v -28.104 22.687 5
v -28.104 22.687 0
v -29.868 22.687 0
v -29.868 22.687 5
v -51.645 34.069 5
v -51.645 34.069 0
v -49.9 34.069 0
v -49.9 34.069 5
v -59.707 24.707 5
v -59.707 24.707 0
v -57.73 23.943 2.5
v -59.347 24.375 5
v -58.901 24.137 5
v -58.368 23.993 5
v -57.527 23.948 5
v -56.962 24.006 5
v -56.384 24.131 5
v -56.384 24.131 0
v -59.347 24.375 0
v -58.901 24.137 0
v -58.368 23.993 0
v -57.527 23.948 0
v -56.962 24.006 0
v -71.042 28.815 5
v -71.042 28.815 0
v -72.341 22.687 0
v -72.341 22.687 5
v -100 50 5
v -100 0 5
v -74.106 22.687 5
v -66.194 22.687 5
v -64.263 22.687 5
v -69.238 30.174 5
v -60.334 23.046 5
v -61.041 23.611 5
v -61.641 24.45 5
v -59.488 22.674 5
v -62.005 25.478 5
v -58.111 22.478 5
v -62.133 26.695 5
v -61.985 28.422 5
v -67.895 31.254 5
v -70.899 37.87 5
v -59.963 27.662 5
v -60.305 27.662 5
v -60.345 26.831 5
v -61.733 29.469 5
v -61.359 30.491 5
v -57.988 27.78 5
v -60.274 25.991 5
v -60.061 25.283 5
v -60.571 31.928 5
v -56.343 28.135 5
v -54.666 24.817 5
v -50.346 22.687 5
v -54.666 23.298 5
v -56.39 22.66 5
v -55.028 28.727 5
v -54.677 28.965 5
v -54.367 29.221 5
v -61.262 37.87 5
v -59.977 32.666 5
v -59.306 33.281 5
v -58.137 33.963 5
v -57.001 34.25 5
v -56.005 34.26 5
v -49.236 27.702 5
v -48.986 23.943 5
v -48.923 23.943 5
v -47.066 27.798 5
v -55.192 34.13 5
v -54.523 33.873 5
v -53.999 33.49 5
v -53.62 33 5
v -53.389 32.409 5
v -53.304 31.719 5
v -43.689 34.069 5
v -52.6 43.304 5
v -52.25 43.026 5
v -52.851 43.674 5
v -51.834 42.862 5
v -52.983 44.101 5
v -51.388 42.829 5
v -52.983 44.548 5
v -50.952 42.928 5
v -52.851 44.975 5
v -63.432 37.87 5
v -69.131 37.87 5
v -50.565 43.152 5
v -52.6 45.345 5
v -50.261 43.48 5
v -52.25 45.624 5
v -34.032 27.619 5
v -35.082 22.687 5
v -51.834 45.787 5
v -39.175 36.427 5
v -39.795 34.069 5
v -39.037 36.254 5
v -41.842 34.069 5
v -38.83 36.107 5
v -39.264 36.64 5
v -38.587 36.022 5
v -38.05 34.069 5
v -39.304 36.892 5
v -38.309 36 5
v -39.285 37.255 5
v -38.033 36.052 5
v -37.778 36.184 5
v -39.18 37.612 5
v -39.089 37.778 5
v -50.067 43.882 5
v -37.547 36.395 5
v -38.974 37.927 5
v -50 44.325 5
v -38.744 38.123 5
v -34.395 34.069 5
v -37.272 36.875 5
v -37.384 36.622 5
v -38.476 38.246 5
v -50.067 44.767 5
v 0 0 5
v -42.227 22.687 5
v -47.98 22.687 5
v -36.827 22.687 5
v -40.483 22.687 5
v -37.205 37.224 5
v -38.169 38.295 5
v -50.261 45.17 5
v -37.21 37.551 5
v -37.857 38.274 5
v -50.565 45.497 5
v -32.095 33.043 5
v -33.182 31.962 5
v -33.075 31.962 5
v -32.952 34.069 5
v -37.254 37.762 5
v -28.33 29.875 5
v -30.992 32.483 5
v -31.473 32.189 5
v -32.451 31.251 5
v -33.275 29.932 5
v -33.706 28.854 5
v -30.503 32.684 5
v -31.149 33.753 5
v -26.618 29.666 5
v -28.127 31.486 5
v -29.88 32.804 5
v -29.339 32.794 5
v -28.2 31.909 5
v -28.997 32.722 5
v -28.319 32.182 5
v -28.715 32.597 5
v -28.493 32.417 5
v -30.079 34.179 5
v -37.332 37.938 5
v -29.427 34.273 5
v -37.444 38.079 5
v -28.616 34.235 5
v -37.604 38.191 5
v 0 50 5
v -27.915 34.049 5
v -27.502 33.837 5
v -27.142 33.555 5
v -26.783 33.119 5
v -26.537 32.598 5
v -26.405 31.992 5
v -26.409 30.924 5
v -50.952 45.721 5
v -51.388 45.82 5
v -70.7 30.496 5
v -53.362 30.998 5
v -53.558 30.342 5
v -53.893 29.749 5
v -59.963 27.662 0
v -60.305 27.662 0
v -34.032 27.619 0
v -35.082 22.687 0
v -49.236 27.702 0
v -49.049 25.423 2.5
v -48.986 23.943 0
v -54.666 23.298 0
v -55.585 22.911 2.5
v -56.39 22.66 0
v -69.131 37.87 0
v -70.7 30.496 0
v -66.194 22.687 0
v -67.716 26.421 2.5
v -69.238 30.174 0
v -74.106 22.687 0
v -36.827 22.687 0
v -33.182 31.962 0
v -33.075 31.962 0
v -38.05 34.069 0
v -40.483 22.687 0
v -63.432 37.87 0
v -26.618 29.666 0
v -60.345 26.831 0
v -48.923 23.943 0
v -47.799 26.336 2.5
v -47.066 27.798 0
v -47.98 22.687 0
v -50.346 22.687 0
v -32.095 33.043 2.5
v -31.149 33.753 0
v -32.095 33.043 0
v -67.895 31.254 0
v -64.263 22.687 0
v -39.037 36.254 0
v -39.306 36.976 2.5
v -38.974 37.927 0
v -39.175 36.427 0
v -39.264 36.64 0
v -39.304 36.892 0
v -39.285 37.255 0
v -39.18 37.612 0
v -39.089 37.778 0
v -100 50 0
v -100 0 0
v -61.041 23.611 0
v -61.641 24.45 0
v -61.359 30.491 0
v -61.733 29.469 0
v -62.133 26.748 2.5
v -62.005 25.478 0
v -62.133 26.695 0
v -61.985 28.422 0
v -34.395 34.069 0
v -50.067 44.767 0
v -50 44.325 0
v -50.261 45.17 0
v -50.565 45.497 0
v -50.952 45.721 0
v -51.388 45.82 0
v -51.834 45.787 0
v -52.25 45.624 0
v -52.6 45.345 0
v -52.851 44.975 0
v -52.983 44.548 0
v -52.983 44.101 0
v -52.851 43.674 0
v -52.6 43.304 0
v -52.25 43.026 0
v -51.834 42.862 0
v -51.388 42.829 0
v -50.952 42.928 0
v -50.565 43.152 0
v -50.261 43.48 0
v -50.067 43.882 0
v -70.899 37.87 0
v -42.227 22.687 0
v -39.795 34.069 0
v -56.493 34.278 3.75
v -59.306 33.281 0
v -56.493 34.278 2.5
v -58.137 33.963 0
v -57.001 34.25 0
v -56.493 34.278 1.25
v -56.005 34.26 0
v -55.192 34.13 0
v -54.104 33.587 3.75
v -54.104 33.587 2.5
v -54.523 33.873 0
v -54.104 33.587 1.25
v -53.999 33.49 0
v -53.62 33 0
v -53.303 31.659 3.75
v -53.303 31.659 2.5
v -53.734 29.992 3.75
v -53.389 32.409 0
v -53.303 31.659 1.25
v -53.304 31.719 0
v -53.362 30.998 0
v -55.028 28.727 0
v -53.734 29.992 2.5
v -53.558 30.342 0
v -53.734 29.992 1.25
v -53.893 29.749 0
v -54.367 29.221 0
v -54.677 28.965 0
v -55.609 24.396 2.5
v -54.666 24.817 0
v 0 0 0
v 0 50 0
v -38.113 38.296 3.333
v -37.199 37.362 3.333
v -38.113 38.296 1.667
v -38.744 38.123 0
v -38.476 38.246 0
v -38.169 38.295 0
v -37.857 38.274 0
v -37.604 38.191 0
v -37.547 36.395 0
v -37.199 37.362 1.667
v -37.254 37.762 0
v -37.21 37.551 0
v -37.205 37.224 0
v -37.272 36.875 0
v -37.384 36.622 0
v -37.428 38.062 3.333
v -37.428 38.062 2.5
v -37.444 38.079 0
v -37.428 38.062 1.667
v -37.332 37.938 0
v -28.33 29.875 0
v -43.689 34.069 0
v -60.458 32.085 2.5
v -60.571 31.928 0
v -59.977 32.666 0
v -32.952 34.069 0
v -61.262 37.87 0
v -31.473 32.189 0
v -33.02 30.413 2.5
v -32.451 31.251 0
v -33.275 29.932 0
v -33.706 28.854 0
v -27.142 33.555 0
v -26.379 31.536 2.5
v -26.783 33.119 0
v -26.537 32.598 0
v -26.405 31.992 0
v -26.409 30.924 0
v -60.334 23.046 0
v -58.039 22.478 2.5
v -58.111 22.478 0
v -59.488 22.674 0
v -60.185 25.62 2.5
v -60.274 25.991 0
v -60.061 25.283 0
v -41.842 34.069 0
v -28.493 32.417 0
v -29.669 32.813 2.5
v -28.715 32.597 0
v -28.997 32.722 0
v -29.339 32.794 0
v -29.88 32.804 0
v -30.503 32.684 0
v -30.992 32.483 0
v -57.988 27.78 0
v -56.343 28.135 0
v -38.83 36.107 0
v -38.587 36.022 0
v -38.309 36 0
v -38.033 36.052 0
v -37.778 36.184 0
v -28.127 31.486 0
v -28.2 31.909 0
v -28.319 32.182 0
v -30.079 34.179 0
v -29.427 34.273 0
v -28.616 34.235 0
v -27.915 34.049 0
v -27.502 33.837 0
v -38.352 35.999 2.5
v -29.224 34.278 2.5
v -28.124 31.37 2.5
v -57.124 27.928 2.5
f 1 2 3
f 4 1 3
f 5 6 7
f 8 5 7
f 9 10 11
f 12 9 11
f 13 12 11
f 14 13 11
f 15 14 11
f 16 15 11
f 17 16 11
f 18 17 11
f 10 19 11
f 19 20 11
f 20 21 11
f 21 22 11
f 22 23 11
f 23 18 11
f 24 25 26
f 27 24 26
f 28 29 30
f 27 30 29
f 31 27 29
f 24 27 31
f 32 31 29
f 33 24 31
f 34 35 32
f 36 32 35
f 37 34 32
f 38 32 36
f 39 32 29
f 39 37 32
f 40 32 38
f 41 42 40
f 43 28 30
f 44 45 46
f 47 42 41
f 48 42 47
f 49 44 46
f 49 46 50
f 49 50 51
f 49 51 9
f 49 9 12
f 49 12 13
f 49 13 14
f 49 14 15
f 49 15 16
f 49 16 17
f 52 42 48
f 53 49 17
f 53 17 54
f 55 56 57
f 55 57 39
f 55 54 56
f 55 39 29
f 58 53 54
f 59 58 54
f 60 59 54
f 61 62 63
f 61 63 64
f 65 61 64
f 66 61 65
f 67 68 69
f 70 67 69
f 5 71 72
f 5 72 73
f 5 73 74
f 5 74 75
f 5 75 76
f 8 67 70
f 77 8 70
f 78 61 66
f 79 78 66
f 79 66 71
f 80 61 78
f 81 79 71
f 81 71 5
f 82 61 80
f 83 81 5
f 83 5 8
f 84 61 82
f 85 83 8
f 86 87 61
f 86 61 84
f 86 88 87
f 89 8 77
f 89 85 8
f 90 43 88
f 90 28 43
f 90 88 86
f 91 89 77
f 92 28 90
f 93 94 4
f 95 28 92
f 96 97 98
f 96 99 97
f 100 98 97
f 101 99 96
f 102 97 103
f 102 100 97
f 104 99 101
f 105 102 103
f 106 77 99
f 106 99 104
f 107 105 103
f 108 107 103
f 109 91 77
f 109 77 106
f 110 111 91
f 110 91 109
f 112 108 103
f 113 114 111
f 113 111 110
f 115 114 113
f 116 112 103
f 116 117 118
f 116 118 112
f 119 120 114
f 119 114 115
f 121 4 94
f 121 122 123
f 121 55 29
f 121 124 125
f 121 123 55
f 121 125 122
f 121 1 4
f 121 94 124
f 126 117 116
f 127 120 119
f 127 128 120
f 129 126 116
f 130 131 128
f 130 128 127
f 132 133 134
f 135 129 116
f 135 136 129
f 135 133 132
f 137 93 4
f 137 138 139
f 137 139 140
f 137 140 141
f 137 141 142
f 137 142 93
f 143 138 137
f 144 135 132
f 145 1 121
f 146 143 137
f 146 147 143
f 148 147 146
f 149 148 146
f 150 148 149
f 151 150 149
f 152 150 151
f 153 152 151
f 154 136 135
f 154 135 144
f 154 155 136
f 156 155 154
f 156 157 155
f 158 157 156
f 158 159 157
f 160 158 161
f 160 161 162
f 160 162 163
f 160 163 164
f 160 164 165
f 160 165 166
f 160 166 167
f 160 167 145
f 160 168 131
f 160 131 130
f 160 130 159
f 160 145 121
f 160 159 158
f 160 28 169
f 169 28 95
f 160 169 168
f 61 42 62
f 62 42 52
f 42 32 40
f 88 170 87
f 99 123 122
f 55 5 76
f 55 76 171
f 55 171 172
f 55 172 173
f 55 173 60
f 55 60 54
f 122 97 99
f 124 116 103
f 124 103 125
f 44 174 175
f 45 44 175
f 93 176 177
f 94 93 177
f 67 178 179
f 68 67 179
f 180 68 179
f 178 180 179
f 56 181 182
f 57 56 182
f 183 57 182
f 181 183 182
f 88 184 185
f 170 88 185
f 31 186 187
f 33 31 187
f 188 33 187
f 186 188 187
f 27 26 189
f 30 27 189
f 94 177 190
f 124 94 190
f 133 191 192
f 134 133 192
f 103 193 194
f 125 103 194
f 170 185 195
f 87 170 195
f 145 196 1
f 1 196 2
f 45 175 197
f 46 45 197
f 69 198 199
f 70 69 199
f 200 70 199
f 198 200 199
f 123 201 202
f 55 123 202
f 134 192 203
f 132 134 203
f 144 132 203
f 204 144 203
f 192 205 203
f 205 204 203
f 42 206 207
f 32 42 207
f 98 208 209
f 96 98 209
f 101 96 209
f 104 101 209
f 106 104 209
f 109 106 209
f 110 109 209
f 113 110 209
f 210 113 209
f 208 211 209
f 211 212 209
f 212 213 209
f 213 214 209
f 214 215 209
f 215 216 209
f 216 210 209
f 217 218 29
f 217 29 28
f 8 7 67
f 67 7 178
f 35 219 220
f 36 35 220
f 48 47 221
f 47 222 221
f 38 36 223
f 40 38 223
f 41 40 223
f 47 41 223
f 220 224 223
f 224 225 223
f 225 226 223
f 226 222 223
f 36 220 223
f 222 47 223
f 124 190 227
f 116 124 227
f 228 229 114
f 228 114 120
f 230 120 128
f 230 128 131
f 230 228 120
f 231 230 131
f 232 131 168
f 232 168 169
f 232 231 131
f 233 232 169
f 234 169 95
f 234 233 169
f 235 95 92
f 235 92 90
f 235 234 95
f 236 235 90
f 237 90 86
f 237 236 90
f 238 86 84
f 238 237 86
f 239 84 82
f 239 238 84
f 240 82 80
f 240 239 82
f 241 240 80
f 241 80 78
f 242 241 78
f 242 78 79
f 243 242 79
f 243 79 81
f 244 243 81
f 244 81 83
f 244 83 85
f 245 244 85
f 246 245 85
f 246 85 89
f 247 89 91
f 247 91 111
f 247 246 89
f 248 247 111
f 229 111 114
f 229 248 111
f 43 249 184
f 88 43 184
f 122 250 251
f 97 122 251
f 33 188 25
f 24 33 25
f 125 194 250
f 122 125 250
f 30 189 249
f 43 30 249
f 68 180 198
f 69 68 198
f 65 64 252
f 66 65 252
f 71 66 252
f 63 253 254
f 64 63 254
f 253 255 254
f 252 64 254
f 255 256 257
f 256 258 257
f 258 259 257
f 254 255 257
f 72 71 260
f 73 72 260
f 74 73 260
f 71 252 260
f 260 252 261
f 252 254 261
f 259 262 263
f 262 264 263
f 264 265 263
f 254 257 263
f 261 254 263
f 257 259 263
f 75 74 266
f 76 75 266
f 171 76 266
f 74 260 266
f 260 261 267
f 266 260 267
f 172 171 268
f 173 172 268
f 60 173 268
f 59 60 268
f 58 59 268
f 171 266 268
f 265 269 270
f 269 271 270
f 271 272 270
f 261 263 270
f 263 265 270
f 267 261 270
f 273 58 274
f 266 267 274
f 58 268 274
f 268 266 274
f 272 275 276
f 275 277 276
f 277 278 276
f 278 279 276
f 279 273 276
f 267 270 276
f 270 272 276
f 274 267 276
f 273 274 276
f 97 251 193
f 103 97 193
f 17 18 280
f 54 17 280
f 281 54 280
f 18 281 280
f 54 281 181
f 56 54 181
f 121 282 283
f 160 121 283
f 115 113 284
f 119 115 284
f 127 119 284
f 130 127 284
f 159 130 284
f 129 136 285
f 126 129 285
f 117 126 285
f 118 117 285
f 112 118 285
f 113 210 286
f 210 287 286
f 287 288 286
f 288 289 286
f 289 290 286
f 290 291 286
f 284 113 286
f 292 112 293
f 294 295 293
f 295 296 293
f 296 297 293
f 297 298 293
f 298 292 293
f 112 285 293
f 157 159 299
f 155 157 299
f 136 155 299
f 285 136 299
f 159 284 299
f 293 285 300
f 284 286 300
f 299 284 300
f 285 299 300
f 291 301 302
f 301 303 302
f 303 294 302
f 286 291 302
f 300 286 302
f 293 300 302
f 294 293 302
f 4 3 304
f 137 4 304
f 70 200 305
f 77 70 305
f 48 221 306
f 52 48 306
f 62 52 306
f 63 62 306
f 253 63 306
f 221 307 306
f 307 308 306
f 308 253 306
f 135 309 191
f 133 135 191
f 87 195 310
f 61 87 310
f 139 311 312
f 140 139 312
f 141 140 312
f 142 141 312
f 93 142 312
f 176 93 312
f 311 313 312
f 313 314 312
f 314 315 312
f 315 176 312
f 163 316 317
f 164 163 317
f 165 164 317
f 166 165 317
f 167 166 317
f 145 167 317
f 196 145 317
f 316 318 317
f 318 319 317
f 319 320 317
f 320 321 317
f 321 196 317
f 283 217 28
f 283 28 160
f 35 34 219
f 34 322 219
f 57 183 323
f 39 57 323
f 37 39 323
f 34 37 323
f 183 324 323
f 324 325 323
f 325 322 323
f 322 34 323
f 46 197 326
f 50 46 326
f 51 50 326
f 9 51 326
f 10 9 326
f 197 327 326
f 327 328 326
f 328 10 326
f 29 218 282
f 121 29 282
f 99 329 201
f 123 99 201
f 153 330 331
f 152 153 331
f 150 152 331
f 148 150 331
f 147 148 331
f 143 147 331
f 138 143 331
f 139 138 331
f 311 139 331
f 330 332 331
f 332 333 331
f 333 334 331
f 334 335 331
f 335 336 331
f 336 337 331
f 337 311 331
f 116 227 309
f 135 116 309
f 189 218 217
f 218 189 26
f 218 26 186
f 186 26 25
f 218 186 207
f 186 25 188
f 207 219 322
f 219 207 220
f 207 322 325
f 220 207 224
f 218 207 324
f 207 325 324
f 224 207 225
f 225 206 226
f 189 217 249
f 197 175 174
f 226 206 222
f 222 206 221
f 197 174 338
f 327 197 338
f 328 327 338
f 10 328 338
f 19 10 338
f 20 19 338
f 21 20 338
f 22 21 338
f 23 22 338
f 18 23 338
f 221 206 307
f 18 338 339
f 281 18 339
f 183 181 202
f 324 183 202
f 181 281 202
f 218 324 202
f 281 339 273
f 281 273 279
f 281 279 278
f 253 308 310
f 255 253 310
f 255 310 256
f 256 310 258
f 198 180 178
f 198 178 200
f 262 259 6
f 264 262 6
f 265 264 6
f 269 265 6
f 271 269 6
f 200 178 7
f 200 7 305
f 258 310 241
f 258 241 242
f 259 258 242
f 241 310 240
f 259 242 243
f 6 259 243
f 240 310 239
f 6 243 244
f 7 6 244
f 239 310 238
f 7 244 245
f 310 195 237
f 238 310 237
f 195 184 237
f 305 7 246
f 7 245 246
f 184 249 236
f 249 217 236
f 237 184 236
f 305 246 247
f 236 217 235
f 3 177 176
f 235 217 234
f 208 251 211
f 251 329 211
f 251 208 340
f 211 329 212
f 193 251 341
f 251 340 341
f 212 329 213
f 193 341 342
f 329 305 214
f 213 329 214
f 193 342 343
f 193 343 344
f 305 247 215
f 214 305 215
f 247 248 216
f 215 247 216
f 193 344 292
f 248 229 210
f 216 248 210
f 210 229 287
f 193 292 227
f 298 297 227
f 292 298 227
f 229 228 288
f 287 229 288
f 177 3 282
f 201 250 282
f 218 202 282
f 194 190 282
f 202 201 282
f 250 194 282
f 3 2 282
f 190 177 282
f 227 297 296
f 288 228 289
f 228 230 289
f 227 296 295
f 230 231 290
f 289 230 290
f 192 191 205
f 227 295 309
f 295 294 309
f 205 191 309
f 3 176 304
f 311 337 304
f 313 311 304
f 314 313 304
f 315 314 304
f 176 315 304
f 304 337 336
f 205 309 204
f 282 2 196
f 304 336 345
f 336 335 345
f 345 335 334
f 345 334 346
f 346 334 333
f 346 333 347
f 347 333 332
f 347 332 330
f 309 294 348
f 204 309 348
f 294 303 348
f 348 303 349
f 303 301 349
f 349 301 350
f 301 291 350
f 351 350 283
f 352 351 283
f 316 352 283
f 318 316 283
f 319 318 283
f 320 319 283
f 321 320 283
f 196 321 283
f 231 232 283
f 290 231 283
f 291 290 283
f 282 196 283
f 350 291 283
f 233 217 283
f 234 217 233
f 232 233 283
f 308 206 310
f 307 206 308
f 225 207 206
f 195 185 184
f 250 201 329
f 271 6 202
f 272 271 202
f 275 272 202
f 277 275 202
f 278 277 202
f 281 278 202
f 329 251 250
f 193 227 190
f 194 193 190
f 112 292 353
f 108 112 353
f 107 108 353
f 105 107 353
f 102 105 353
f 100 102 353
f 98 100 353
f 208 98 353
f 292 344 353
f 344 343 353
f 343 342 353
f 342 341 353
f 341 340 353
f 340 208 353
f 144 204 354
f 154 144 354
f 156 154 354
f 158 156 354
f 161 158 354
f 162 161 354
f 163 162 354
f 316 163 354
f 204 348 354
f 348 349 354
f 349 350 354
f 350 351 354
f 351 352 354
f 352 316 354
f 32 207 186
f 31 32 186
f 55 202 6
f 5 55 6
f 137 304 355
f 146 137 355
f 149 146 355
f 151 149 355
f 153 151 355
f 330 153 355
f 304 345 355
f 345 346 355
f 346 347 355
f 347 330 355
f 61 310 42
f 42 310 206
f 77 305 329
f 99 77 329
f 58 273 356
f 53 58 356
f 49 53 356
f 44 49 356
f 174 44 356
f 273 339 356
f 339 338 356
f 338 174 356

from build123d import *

# Parameters (mm, degrees)
F0_W     = 100
F0_H     = 50
F0_R     = 1.5
F1_DEPTH = 5


with BuildPart() as f1:
    # F0 (on Top) → F1 (new body)
    with BuildSketch(Plane.XY):
        with Locations((-50, 25)):
            Rectangle(F0_W, F0_H)
        with BuildLine():
            Line((-67.895121627, 31.2540210023), (-64.2629270238, 22.6869599894))
            Line((-64.2629270238, 22.6869599894), (-66.1936727369, 22.6869599894))
            add(Edge.make_bspline(
                [(-66.1936727369, 22.6869599894), (-66.9413797687, 24.5678585671), (-67.7156719394, 26.4205104347)],
                knots=[0, 0, 0, 1, 1, 1], degree=2))
            add(Edge.make_bspline(
                [(-67.7156719394, 26.4205104347), (-68.4899641101, 28.2731623023), (-69.2376711418, 30.1739997341)],
                knots=[0, 0, 0, 1, 1, 1], degree=2))
            Line((-69.2376711418, 30.1739997341), (-71.0421374452, 28.8148345075))
            Line((-71.0421374452, 28.8148345075), (-72.3414861093, 22.6869599894))
            Line((-72.3414861093, 22.6869599894), (-74.1060747042, 22.6869599894))
            Line((-74.1060747042, 22.6869599894), (-70.8992423235, 37.8703974478))
            Line((-70.8992423235, 37.8703974478), (-69.1313305862, 37.8703974478))
            Line((-69.1313305862, 37.8703974478), (-70.6998537817, 30.4963445434))
            Line((-70.6998537817, 30.4963445434), (-63.4321414329, 37.8703974478))
            Line((-63.4321414329, 37.8703974478), (-61.2621294696, 37.8703974478))
            Line((-61.2621294696, 37.8703974478), (-67.895121627, 31.2540210023))
        make_face(mode=Mode.SUBTRACT)
        with BuildLine():
            add(Edge.make_bspline(
                [(-56.3904027649, 22.6603748505), (-57.1381097966, 22.4776020205), (-58.0386813771, 22.4776020205)],
                knots=[0, 0, 0, 1, 1, 1], degree=2))
            add(Edge.make_bspline(
                [(-58.0386813771, 22.4776020205), (-59.9494882361, 22.4776020205), (-61.0411405025, 23.6107935664)],
                knots=[0, 0, 0, 1, 1, 1], degree=2))
            add(Edge.make_bspline(
                [(-61.0411405025, 23.6107935664), (-62.1327927688, 24.7439851123), (-62.1327927688, 26.7478399575)],
                knots=[0, 0, 0, 1, 1, 1], degree=2))
            add(Edge.make_bspline(
                [(-62.1327927688, 26.7478399575), (-62.1327927688, 28.6985245248), (-61.3585005982, 30.4913598299)],
                knots=[0, 0, 0, 1, 1, 1], degree=2))
            add(Edge.make_bspline(
                [(-61.3585005982, 30.4913598299), (-60.5842084275, 32.2841951349), (-59.3064601888, 33.2811378439)],
                knots=[0, 0, 0, 1, 1, 1], degree=2))
            add(Edge.make_bspline(
                [(-59.3064601888, 33.2811378439), (-58.02871195, 34.278080553), (-56.4934201781, 34.278080553)],
                knots=[0, 0, 0, 1, 1, 1], degree=2))
            add(Edge.make_bspline(
                [(-56.4934201781, 34.278080553), (-54.9049581284, 34.278080553), (-54.1040808188, 33.5868669414)],
                knots=[0, 0, 0, 1, 1, 1], degree=2))
            add(Edge.make_bspline(
                [(-54.1040808188, 33.5868669414), (-53.3032035092, 32.8956533298), (-53.3032035092, 31.6594443706)],
                knots=[0, 0, 0, 1, 1, 1], degree=2))
            add(Edge.make_bspline(
                [(-53.3032035092, 31.6594443706), (-53.3032035092, 29.7918383624), (-55.0279143959, 28.7267712349)],
                knots=[0, 0, 0, 1, 1, 1], degree=2))
            add(Edge.make_bspline(
                [(-55.0279143959, 28.7267712349), (-56.7526252825, 27.6617041074), (-59.9627808055, 27.6617041074)],
                knots=[0, 0, 0, 1, 1, 1], degree=2))
            Line((-59.9627808055, 27.6617041074), (-60.305064469, 27.6617041074))
            Line((-60.305064469, 27.6617041074), (-60.3449421773, 26.8309185165))
            add(Edge.make_bspline(
                [(-60.3449421773, 26.8309185165), (-60.3449421773, 25.4717532899), (-59.7068988435, 24.7074305463)],
                knots=[0, 0, 0, 1, 1, 1], degree=2))
            add(Edge.make_bspline(
                [(-59.7068988435, 24.7074305463), (-59.0688555098, 23.9431078027), (-57.7296291373, 23.9431078027)],
                knots=[0, 0, 0, 1, 1, 1], degree=2))
            add(Edge.make_bspline(
                [(-57.7296291373, 23.9431078027), (-57.0749700917, 23.9431078027), (-56.3837564801, 24.1308653463)],
                knots=[0, 0, 0, 1, 1, 1], degree=2))
            add(Edge.make_bspline(
                [(-56.3837564801, 24.1308653463), (-55.6925428685, 24.3186228898), (-54.6656918782, 24.8170942443)],
                knots=[0, 0, 0, 1, 1, 1], degree=2))
            Line((-54.6656918782, 24.8170942443), (-54.6656918782, 23.2984181842))
            add(Edge.make_bspline(
                [(-54.6656918782, 23.2984181842), (-55.6426957331, 22.8431476804), (-56.3904027649, 22.6603748505)],
                knots=[0, 0, 0, 1, 1, 1], degree=2))
        make_face(mode=Mode.SUBTRACT)
        with Locations((-51.5, 44.3245553203)):
            Circle(F0_R, mode=Mode.SUBTRACT)
        with BuildLine():
            Line((-47.979529443, 22.6869599894), (-50.3456068058, 22.6869599894))
            Line((-50.3456068058, 22.6869599894), (-51.6449554699, 34.0687225841))
            Line((-51.6449554699, 34.0687225841), (-49.9003057291, 34.0687225841))
            Line((-49.9003057291, 34.0687225841), (-49.2356772564, 27.7015818158))
            add(Edge.make_bspline(
                [(-49.2356772564, 27.7015818158), (-48.9864415792, 25.0231290708), (-48.9864415792, 23.9431078027)],
                knots=[0, 0, 0, 1, 1, 1], degree=2))
            Line((-48.9864415792, 23.9431078027), (-48.9233018743, 23.9431078027))
            add(Edge.make_bspline(
                [(-48.9233018743, 23.9431078027), (-47.604014356, 26.8010102353), (-47.0656652931, 27.7979529443)],
                knots=[0, 0, 0, 1, 1, 1], degree=2))
            Line((-47.0656652931, 27.7979529443), (-43.6893526519, 34.0687225841))
            Line((-43.6893526519, 34.0687225841), (-41.8416854978, 34.0687225841))
            Line((-41.8416854978, 34.0687225841), (-47.979529443, 22.6869599894))
        make_face(mode=Mode.SUBTRACT)
        Polygon((-38.0499800611, 34.0687225841), (-40.4825202712, 22.6869599894), (-42.227170012, 22.6869599894), (-39.7946298019, 34.0687225841), align=None, mode=Mode.SUBTRACT)
        with BuildLine():
            Line((-28.1038149674, 22.6869599894), (-29.8684035624, 22.6869599894))
            Line((-29.8684035624, 22.6869599894), (-28.3297886481, 29.8749169214))
            add(Edge.make_bspline(
                [(-28.3297886481, 29.8749169214), (-28.1237538216, 30.9549381896), (-28.1237538216, 31.370330985)],
                knots=[0, 0, 0, 1, 1, 1], degree=2))
            add(Edge.make_bspline(
                [(-28.1237538216, 31.370330985), (-28.1237538216, 32.0216668882), (-28.492622624, 32.4171208295)],
                knots=[0, 0, 0, 1, 1, 1], degree=2))
            add(Edge.make_bspline(
                [(-28.492622624, 32.4171208295), (-28.8614914263, 32.8125747707), (-29.6690150206, 32.8125747707)],
                knots=[0, 0, 0, 1, 1, 1], degree=2))
            add(Edge.make_bspline(
                [(-29.6690150206, 32.8125747707), (-30.59617174, 32.8125747707), (-31.4734813239, 32.1894855776)],
                knots=[0, 0, 0, 1, 1, 1], degree=2))
            add(Edge.make_bspline(
                [(-31.4734813239, 32.1894855776), (-32.3507909079, 31.5663963844), (-33.0204040941, 30.4132659843)],
                knots=[0, 0, 0, 1, 1, 1], degree=2))
            add(Edge.make_bspline(
                [(-33.0204040941, 30.4132659843), (-33.6900172803, 29.2601355842), (-34.0323009438, 27.6185032567)],
                knots=[0, 0, 0, 1, 1, 1], degree=2))
            Line((-34.0323009438, 27.6185032567), (-35.0824139306, 22.6869599894))
            Line((-35.0824139306, 22.6869599894), (-36.8270636714, 22.6869599894))
            Line((-36.8270636714, 22.6869599894), (-34.3945234614, 34.0687225841))
            Line((-34.3945234614, 34.0687225841), (-32.9522796757, 34.0687225841))
            Line((-32.9522796757, 34.0687225841), (-33.1815764987, 31.9618503257))
            Line((-33.1815764987, 31.9618503257), (-33.0752359431, 31.9618503257))
            add(Edge.make_bspline(
                [(-33.0752359431, 31.9618503257), (-32.0782932341, 33.2279675661), (-31.1494749435, 33.7530240596)],
                knots=[0, 0, 0, 1, 1, 1], degree=2))
            add(Edge.make_bspline(
                [(-31.1494749435, 33.7530240596), (-30.2206566529, 34.278080553), (-29.2237139439, 34.278080553)],
                knots=[0, 0, 0, 1, 1, 1], degree=2))
            add(Edge.make_bspline(
                [(-29.2237139439, 34.278080553), (-27.9044264256, 34.278080553), (-27.1417652532, 33.5552970889)],
                knots=[0, 0, 0, 1, 1, 1], degree=2))
            add(Edge.make_bspline(
                [(-27.1417652532, 33.5552970889), (-26.3791040808, 32.8325136249), (-26.3791040808, 31.5364881032)],
                knots=[0, 0, 0, 1, 1, 1], degree=2))
            add(Edge.make_bspline(
                [(-26.3791040808, 31.5364881032), (-26.3791040808, 30.7156719394), (-26.618370331, 29.6655589525)],
                knots=[0, 0, 0, 1, 1, 1], degree=2))
            Line((-26.618370331, 29.6655589525), (-28.1038149674, 22.6869599894))
        make_face(mode=Mode.SUBTRACT)
        with BuildLine():
            add(Edge.make_bspline(
                [(-39.0369533431, 36.253688688), (-39.3061278745, 36.5079090788), (-39.3061278745, 36.9764721521)],
                knots=[0, 0, 0, 1, 1, 1], degree=2))
            add(Edge.make_bspline(
                [(-39.3061278745, 36.9764721521), (-39.3061278745, 37.5580220657), (-38.9738136382, 37.926890868)],
                knots=[0, 0, 0, 1, 1, 1], degree=2))
            add(Edge.make_bspline(
                [(-38.9738136382, 37.926890868), (-38.6414994018, 38.2957596703), (-38.1131197661, 38.2957596703)],
                knots=[0, 0, 0, 1, 1, 1], degree=2))
            add(Edge.make_bspline(
                [(-38.1131197661, 38.2957596703), (-37.1992556161, 38.2957596703), (-37.1992556161, 37.3619566662)],
                knots=[0, 0, 0, 1, 1, 1], degree=2))
            add(Edge.make_bspline(
                [(-37.1992556161, 37.3619566662), (-37.1992556161, 36.7903761797), (-37.5465239931, 36.3949222385)],
                knots=[0, 0, 0, 1, 1, 1], degree=2))
            add(Edge.make_bspline(
                [(-37.5465239931, 36.3949222385), (-37.8937923701, 35.9994682972), (-38.3523860162, 35.9994682972)],
                knots=[0, 0, 0, 1, 1, 1], degree=2))
            add(Edge.make_bspline(
                [(-38.3523860162, 35.9994682972), (-38.7677788116, 35.9994682972), (-39.0369533431, 36.253688688)],
                knots=[0, 0, 0, 1, 1, 1], degree=2))
        make_face(mode=Mode.SUBTRACT)
    extrude(amount=F1_DEPTH)


solid = f1.part
